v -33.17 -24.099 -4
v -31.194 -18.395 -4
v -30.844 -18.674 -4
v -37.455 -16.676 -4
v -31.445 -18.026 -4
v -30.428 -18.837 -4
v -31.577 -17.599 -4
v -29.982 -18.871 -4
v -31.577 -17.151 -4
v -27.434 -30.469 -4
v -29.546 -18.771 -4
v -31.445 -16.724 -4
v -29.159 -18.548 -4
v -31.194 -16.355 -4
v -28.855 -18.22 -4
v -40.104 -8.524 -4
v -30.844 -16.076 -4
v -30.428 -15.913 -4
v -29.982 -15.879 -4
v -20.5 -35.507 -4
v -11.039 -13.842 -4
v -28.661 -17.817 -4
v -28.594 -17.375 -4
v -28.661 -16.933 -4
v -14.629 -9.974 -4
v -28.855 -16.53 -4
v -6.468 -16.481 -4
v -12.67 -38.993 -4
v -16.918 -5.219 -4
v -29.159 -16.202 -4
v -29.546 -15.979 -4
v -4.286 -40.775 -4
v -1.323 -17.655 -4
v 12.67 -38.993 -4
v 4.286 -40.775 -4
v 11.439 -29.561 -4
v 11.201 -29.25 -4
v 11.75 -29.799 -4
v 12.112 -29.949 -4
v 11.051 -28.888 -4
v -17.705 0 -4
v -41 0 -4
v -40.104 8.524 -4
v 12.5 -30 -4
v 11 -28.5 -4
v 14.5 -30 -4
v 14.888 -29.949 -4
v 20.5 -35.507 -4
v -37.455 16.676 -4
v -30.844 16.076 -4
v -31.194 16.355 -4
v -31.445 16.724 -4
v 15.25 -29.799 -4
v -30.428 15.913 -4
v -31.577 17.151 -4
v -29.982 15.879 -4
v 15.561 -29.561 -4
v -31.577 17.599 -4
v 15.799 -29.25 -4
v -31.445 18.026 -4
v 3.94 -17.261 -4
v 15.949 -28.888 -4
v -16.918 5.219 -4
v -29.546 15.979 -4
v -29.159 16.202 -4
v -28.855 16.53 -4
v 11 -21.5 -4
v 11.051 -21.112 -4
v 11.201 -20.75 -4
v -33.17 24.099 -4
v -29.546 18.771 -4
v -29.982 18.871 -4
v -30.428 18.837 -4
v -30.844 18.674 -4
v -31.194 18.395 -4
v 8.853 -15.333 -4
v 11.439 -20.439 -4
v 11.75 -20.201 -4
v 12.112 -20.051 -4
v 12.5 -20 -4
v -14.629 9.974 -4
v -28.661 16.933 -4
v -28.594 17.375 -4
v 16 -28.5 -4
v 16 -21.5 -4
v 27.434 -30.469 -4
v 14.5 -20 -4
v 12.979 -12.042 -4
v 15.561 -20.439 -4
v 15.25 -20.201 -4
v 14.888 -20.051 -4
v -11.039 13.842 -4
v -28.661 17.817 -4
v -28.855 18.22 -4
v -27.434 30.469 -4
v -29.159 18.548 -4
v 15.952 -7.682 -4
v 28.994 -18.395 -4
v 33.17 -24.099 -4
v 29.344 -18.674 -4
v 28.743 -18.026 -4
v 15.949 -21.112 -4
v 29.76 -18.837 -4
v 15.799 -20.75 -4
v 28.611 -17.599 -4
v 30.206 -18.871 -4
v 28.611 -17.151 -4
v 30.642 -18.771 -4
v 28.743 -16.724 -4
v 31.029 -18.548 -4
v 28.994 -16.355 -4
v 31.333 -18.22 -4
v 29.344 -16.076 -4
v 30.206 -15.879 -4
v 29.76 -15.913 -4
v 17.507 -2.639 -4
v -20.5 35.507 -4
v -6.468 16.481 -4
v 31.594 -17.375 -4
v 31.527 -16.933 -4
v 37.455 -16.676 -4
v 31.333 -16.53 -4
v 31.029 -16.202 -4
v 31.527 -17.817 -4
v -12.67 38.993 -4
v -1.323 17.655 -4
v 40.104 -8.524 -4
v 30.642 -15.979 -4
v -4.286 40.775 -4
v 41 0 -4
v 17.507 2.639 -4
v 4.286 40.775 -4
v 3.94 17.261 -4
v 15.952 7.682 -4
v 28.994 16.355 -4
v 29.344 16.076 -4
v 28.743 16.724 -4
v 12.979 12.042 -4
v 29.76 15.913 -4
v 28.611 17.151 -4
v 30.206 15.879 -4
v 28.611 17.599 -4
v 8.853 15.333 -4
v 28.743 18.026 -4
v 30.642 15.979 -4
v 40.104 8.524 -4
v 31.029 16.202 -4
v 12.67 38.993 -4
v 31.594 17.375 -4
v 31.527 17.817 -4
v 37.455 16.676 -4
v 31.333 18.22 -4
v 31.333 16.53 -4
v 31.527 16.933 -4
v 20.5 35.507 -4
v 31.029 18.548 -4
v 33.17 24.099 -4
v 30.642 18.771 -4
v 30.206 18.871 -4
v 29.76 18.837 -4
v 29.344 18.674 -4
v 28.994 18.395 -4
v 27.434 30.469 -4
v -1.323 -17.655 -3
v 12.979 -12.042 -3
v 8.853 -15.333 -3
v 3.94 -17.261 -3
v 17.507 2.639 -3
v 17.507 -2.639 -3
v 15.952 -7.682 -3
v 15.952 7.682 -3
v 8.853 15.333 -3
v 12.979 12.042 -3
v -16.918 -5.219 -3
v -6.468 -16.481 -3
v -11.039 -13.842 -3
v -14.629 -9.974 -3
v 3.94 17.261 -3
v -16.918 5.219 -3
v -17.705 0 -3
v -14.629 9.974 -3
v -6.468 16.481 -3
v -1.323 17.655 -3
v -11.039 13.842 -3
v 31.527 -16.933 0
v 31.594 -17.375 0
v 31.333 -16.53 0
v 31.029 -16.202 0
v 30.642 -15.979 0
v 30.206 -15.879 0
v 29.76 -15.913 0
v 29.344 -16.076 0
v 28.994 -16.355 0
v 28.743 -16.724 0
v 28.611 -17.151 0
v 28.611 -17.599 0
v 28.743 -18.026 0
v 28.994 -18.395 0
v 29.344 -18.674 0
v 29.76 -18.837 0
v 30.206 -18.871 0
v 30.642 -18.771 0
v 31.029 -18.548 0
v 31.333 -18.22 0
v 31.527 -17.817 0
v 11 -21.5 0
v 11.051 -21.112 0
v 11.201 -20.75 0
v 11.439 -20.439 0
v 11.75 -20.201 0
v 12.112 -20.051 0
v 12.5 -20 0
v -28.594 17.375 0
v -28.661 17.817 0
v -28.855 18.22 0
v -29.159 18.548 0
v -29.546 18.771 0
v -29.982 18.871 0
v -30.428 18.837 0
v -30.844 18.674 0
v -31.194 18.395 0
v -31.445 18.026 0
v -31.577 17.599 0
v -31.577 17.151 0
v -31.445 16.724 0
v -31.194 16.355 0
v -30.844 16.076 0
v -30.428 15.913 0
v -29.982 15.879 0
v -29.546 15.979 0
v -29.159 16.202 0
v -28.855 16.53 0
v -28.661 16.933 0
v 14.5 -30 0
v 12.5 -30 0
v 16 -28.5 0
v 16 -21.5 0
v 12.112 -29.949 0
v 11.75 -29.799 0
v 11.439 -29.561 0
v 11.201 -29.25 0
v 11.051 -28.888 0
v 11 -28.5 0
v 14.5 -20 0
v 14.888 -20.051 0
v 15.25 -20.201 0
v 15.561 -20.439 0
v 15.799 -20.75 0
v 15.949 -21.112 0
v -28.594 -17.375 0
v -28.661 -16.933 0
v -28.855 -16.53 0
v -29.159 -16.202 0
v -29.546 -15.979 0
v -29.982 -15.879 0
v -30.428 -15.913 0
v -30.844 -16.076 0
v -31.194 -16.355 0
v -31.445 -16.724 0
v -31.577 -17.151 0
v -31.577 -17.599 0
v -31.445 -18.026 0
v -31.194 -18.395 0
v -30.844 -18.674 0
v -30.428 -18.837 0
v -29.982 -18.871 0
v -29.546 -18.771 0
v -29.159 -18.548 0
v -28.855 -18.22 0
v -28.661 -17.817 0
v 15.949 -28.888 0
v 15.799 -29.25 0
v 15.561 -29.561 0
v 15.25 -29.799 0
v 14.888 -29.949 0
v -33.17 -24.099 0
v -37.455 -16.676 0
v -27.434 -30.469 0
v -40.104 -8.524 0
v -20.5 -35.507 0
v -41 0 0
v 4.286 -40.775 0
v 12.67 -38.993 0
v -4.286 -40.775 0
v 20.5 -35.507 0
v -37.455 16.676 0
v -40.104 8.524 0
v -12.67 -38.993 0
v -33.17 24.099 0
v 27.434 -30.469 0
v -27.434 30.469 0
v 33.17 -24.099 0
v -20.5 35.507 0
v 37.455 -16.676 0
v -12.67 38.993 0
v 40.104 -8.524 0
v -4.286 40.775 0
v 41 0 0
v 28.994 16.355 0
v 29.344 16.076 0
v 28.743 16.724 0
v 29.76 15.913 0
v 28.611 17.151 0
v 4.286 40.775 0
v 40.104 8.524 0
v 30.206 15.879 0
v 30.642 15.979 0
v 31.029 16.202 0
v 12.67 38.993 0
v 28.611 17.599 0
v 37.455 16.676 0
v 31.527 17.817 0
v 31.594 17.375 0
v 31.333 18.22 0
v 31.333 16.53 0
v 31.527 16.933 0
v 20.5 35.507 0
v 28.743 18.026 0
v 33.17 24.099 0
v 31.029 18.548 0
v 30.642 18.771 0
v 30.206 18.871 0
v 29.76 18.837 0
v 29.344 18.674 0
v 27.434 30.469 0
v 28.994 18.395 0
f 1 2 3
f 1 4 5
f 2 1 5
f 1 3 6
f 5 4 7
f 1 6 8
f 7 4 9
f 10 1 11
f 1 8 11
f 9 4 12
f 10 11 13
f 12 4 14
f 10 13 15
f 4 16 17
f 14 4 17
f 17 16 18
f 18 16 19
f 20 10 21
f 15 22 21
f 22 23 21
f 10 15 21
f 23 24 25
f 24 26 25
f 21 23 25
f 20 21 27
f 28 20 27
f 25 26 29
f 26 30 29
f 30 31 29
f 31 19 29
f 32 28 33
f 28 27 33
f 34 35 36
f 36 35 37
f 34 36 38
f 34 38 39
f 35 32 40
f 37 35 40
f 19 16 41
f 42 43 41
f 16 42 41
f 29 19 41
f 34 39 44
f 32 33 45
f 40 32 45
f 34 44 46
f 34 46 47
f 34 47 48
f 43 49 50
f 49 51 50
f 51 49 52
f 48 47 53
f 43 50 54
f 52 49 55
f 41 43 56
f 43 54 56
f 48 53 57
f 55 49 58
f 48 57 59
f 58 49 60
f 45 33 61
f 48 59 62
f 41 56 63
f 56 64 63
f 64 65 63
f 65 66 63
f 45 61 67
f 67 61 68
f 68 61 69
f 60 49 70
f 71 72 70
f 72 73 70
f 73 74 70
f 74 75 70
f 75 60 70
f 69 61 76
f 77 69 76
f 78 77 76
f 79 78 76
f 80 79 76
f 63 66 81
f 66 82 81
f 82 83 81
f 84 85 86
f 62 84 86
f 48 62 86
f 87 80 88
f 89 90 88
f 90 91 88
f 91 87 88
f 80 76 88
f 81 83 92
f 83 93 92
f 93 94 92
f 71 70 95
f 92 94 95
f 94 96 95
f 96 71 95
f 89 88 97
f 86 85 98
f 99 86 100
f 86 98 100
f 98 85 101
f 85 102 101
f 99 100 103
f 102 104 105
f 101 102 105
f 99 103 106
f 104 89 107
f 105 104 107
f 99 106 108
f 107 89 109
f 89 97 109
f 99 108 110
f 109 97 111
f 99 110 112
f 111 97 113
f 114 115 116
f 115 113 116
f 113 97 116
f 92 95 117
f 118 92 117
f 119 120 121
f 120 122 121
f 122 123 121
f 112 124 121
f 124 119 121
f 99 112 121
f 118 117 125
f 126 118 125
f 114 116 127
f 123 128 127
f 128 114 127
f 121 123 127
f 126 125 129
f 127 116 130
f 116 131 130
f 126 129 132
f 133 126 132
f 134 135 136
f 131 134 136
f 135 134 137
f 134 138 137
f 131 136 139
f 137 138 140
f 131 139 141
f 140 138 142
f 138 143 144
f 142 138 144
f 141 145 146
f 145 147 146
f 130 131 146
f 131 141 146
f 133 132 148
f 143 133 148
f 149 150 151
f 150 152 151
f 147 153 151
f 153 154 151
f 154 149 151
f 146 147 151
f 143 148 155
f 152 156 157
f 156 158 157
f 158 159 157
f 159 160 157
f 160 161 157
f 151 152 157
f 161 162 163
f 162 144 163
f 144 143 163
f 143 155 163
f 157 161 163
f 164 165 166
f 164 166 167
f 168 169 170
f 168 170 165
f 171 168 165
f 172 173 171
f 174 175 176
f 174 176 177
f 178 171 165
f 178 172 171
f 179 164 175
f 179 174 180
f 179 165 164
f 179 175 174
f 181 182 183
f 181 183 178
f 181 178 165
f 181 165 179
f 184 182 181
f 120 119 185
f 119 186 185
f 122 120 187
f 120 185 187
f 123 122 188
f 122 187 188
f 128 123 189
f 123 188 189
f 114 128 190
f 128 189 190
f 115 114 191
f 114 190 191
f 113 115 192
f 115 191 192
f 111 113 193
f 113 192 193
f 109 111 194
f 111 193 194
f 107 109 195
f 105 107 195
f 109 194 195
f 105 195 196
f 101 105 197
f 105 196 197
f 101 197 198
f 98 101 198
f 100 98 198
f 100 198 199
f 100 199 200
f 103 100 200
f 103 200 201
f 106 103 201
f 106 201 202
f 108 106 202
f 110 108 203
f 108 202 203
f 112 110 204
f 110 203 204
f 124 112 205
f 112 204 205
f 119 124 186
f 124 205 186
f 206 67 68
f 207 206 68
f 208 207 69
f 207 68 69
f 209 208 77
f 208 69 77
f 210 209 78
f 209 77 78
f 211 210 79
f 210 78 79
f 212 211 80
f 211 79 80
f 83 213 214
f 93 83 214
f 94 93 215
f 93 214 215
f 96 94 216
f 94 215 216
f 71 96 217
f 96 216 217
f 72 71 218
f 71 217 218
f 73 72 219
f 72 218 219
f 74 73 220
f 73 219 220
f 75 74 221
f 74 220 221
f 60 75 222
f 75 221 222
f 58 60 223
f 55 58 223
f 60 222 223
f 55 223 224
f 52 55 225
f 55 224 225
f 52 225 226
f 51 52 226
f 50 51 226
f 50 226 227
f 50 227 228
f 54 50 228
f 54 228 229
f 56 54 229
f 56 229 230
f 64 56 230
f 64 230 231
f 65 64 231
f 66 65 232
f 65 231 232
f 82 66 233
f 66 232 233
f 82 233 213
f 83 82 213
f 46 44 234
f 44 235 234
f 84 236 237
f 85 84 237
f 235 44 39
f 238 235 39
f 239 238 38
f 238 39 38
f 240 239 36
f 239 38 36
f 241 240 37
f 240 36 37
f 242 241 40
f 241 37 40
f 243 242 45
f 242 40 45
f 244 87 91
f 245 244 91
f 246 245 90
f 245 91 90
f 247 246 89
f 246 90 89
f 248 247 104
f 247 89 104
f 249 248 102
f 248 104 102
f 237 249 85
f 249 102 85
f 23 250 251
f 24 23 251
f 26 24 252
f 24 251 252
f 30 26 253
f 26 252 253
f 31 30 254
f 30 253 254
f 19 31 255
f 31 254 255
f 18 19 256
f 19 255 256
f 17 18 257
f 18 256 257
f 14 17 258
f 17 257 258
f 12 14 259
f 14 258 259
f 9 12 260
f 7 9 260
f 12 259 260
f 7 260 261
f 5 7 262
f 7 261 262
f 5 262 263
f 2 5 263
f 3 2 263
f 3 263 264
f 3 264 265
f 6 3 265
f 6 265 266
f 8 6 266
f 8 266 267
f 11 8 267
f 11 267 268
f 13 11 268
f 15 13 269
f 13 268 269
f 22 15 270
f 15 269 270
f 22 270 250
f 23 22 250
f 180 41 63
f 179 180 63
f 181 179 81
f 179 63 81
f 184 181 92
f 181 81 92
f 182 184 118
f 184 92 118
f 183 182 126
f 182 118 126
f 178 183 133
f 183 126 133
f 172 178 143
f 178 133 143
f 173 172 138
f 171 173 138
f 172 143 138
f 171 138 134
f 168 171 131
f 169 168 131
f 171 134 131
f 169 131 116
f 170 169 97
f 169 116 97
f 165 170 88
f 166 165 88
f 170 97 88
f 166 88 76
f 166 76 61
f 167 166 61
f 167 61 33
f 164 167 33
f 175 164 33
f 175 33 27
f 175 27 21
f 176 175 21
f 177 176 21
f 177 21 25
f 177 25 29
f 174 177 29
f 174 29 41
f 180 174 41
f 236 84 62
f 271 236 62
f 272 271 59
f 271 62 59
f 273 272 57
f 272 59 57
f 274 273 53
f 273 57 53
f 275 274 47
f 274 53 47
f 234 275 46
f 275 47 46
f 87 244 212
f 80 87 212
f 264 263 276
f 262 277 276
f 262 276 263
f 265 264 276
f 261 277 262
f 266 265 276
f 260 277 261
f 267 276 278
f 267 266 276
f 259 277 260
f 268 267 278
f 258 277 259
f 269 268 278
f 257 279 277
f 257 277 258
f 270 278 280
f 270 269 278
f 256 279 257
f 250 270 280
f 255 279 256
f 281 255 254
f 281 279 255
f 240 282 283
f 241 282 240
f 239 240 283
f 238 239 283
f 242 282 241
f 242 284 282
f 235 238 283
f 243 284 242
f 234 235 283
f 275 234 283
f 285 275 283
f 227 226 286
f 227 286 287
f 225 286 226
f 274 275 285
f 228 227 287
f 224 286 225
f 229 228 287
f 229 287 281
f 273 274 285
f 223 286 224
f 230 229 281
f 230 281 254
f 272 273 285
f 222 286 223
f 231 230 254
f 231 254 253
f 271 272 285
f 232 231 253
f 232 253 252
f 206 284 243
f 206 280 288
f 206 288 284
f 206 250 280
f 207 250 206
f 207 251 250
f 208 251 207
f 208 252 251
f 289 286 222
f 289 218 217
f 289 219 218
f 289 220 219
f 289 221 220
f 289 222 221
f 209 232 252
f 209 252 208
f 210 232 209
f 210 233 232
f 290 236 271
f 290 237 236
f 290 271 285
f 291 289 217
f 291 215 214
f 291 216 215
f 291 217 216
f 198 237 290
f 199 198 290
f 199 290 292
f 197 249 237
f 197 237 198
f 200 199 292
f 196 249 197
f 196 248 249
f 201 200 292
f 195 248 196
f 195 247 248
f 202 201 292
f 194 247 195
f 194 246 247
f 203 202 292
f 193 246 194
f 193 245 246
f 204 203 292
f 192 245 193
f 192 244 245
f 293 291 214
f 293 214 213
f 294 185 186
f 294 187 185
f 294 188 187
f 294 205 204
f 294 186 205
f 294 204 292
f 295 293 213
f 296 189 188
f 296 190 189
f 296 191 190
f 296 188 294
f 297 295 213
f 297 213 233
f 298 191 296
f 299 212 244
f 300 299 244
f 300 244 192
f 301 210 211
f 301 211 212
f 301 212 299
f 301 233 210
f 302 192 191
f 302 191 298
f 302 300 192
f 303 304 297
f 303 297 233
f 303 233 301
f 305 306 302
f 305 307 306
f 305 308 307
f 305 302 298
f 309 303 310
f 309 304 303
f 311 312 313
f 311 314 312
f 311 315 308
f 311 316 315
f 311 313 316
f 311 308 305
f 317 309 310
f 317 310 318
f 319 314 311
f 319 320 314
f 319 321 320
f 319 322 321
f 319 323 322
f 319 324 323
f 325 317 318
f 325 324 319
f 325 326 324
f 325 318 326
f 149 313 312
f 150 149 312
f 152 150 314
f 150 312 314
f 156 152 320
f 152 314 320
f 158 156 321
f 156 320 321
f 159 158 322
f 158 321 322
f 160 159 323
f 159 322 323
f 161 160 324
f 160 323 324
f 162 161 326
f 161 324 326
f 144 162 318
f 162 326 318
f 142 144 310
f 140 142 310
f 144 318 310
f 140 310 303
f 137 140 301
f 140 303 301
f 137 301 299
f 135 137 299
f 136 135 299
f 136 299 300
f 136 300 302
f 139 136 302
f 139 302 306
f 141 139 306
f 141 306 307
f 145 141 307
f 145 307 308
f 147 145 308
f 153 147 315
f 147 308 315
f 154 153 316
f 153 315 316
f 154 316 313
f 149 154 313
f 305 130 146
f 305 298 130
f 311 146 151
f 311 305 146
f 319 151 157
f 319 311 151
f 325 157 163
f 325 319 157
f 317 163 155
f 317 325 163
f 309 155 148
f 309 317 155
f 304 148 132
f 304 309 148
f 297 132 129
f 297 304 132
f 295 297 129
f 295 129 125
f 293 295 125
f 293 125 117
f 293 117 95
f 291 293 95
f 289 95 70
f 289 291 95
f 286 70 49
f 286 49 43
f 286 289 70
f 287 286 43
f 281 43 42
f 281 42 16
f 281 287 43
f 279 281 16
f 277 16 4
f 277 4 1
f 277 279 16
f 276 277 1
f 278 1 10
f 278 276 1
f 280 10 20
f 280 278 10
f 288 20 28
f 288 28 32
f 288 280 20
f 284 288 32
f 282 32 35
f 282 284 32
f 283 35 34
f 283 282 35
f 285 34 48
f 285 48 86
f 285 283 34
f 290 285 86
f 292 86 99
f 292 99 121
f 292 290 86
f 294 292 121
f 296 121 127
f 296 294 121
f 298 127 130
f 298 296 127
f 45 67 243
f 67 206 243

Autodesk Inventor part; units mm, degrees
ref_plane "YZ Plane" through (0, 0, 0) normal (1, 0, 0) x (0, 1, 0)
sketch "Sketch1" plane through (0, 0, 0) normal (0, 0, 1) x (1, 0, 0)
  circle A0 centre (0, 0) radius 41
  circle A1 centre (0, 0) radius 17.705
  circle A2 centre (0, 0) radius 15
  circle A3 centre (0, 15) radius 0.75
  circle A4 centre (-10.6066, 10.6066) radius 0.75
  circle A5 centre (-15, 0) radius 0.75
  circle A6 centre (-10.6066, -10.6066) radius 0.75
  circle A7 centre (0, -15) radius 0.75
  circle A8 centre (10.6066, -10.6066) radius 0.75
  circle A9 centre (15, 0) radius 0.75
  circle A10 centre (10.6066, 10.6066) radius 0.75
  dimension "d4" = 30
  dimension "d0" = 82
  dimension "d3" = 35.41
  dimension "d5" = 1.5
  dimension "d6" = 360
sketch "Sketch2" plane through (0, 0, 0) normal (0, 0, 1) x (1, 0, 0)
  circle A0 centre (-30.094, -17.375) radius 1.5
  circle A1 centre (-30.094, 17.375) radius 1.5
  circle A2 centre (30.094, 17.375) radius 1.5
  circle A3 centre (30.094, -17.375) radius 1.5
  point P0 (0, 0)
  dimension "d7" = 3
  dimension "d8" = 3
  dimension "d9" = 3
  dimension "d10" = 3
  dimension "d11" = 17.375
  dimension "d12" = 30.094
  dimension "d13" = 30.094
  dimension "d14" = 17.375
  dimension "d15" = 17.375
  dimension "d16" = 30.094
  dimension "d17" = 17.375
  dimension "d18" = 30.094
extrude "Extrusion1" add sketch "Sketch1" against normal blind 4 contours A0 | A1 | A2 A9 | A2 A9 | A9 A2 A8 A7 A6 A5 A4 A3 A10 | A10 A2 | A2 A10 | A8 A2 | A2 A8 | A3 A2 | A2 A3 | A7 A2 | A2 A7 | A4 A2 | A2 A4 | A6 A2 | A2 A6 | A5 A2 | A2 A5
extrude "Extrusion2" cut sketch "Sketch2" against normal blind 4
ref_plane "Work Plane1" through (0, 0, -4) normal (0, 0, 1) x (1, 0, 0)
ref_plane "Work Plane2" through (0, 0, -4) normal (0, 0, 1) x (1, 0, 0)
ref_plane "Work Plane3" through (0, 0, 0) normal (0, 0, 1) x (1, 0, 0)
sketch "Sketch5" plane through (0, 0, 0) normal (0, 0, 1) x (1, 0, 0)
  line L0 (11, -30) -> (16, -30)
  line L1 (16, -30) -> (16, -20)
  line L2 (16, -20) -> (11, -20)
  line L3 (11, -20) -> (11, -30)
  point P0 (0, 0)
  point P1 (13.5, -20)
  point P2 (13.5, -30)
  point P3 (16, -25)
  dimension "d44" = 5
  dimension "d45" = 10
  dimension "d54" = 11
  dimension "d55" = 20
extrude "Extrusion5" cut sketch "Sketch5" against normal blind 4
fillet "Fillet1" radius 1.5 4 edges at (11, -20, -2) (11, -30, -2) (16, -20, -2) (16, -30, -2)
ref_plane "Work Plane4" through (0, 0, 0) normal (0, 0, 1) x (1, 0, 0)
ref_plane "Work Plane5" through (0, 0, -4) normal (0, 0, -1) x (-1, 0, 0)
sketch "Sketch7" plane through (0, 0, -4) normal (0, 0, -1) x (-1, 0, 0)
  circle A0 centre (0, 0) radius 17.705
  circle A1 centre (0, 0) radius 15
  circle A2 centre (0, 15) radius 2.5
  circle A3 centre (-10.6066, 10.6066) radius 2.5
  circle A4 centre (-15, 0) radius 2.5
  circle A5 centre (-10.6066, -10.6066) radius 2.5
  circle A6 centre (0, -15) radius 2.5
  circle A7 centre (10.6066, -10.6066) radius 2.5
  circle A8 centre (15, 0) radius 2.5
  circle A9 centre (10.6066, 10.6066) radius 2.5
  circle A10 centre (0, 0) radius 4.25
  circle A11 centre (0, 0) radius 2.5
  point P0 (0, 0)
  point P1 (0, 0)
  point P2 (0, -4)
  point P3 (0, -19)
  dimension "d60" = 35.41
  dimension "d61" = 5
  dimension "d62" = 360
  dimension "d63" = 8.5
  dimension "d64" = 5
  dimension "d65" = 15
  dimension "d66" = 15
extrude "Extrusion6" cut sketch "Sketch7" against normal blind 1 contours A0 | A1 A8 | A1 A8 | A8 A1 A7 A6 A5 A4 A3 A2 A9 | A9 A1 | A1 A9 | A7 A1 | A1 A7 | A2 A1 | A1 A2 | A6 A1 | A1 A6 | A3 A1 | A1 A3 | A5 A1 | A1 A5 | A4 A1 | A1 A4 | A10 | A11
properties part number "lower-plate_3DPrint"
